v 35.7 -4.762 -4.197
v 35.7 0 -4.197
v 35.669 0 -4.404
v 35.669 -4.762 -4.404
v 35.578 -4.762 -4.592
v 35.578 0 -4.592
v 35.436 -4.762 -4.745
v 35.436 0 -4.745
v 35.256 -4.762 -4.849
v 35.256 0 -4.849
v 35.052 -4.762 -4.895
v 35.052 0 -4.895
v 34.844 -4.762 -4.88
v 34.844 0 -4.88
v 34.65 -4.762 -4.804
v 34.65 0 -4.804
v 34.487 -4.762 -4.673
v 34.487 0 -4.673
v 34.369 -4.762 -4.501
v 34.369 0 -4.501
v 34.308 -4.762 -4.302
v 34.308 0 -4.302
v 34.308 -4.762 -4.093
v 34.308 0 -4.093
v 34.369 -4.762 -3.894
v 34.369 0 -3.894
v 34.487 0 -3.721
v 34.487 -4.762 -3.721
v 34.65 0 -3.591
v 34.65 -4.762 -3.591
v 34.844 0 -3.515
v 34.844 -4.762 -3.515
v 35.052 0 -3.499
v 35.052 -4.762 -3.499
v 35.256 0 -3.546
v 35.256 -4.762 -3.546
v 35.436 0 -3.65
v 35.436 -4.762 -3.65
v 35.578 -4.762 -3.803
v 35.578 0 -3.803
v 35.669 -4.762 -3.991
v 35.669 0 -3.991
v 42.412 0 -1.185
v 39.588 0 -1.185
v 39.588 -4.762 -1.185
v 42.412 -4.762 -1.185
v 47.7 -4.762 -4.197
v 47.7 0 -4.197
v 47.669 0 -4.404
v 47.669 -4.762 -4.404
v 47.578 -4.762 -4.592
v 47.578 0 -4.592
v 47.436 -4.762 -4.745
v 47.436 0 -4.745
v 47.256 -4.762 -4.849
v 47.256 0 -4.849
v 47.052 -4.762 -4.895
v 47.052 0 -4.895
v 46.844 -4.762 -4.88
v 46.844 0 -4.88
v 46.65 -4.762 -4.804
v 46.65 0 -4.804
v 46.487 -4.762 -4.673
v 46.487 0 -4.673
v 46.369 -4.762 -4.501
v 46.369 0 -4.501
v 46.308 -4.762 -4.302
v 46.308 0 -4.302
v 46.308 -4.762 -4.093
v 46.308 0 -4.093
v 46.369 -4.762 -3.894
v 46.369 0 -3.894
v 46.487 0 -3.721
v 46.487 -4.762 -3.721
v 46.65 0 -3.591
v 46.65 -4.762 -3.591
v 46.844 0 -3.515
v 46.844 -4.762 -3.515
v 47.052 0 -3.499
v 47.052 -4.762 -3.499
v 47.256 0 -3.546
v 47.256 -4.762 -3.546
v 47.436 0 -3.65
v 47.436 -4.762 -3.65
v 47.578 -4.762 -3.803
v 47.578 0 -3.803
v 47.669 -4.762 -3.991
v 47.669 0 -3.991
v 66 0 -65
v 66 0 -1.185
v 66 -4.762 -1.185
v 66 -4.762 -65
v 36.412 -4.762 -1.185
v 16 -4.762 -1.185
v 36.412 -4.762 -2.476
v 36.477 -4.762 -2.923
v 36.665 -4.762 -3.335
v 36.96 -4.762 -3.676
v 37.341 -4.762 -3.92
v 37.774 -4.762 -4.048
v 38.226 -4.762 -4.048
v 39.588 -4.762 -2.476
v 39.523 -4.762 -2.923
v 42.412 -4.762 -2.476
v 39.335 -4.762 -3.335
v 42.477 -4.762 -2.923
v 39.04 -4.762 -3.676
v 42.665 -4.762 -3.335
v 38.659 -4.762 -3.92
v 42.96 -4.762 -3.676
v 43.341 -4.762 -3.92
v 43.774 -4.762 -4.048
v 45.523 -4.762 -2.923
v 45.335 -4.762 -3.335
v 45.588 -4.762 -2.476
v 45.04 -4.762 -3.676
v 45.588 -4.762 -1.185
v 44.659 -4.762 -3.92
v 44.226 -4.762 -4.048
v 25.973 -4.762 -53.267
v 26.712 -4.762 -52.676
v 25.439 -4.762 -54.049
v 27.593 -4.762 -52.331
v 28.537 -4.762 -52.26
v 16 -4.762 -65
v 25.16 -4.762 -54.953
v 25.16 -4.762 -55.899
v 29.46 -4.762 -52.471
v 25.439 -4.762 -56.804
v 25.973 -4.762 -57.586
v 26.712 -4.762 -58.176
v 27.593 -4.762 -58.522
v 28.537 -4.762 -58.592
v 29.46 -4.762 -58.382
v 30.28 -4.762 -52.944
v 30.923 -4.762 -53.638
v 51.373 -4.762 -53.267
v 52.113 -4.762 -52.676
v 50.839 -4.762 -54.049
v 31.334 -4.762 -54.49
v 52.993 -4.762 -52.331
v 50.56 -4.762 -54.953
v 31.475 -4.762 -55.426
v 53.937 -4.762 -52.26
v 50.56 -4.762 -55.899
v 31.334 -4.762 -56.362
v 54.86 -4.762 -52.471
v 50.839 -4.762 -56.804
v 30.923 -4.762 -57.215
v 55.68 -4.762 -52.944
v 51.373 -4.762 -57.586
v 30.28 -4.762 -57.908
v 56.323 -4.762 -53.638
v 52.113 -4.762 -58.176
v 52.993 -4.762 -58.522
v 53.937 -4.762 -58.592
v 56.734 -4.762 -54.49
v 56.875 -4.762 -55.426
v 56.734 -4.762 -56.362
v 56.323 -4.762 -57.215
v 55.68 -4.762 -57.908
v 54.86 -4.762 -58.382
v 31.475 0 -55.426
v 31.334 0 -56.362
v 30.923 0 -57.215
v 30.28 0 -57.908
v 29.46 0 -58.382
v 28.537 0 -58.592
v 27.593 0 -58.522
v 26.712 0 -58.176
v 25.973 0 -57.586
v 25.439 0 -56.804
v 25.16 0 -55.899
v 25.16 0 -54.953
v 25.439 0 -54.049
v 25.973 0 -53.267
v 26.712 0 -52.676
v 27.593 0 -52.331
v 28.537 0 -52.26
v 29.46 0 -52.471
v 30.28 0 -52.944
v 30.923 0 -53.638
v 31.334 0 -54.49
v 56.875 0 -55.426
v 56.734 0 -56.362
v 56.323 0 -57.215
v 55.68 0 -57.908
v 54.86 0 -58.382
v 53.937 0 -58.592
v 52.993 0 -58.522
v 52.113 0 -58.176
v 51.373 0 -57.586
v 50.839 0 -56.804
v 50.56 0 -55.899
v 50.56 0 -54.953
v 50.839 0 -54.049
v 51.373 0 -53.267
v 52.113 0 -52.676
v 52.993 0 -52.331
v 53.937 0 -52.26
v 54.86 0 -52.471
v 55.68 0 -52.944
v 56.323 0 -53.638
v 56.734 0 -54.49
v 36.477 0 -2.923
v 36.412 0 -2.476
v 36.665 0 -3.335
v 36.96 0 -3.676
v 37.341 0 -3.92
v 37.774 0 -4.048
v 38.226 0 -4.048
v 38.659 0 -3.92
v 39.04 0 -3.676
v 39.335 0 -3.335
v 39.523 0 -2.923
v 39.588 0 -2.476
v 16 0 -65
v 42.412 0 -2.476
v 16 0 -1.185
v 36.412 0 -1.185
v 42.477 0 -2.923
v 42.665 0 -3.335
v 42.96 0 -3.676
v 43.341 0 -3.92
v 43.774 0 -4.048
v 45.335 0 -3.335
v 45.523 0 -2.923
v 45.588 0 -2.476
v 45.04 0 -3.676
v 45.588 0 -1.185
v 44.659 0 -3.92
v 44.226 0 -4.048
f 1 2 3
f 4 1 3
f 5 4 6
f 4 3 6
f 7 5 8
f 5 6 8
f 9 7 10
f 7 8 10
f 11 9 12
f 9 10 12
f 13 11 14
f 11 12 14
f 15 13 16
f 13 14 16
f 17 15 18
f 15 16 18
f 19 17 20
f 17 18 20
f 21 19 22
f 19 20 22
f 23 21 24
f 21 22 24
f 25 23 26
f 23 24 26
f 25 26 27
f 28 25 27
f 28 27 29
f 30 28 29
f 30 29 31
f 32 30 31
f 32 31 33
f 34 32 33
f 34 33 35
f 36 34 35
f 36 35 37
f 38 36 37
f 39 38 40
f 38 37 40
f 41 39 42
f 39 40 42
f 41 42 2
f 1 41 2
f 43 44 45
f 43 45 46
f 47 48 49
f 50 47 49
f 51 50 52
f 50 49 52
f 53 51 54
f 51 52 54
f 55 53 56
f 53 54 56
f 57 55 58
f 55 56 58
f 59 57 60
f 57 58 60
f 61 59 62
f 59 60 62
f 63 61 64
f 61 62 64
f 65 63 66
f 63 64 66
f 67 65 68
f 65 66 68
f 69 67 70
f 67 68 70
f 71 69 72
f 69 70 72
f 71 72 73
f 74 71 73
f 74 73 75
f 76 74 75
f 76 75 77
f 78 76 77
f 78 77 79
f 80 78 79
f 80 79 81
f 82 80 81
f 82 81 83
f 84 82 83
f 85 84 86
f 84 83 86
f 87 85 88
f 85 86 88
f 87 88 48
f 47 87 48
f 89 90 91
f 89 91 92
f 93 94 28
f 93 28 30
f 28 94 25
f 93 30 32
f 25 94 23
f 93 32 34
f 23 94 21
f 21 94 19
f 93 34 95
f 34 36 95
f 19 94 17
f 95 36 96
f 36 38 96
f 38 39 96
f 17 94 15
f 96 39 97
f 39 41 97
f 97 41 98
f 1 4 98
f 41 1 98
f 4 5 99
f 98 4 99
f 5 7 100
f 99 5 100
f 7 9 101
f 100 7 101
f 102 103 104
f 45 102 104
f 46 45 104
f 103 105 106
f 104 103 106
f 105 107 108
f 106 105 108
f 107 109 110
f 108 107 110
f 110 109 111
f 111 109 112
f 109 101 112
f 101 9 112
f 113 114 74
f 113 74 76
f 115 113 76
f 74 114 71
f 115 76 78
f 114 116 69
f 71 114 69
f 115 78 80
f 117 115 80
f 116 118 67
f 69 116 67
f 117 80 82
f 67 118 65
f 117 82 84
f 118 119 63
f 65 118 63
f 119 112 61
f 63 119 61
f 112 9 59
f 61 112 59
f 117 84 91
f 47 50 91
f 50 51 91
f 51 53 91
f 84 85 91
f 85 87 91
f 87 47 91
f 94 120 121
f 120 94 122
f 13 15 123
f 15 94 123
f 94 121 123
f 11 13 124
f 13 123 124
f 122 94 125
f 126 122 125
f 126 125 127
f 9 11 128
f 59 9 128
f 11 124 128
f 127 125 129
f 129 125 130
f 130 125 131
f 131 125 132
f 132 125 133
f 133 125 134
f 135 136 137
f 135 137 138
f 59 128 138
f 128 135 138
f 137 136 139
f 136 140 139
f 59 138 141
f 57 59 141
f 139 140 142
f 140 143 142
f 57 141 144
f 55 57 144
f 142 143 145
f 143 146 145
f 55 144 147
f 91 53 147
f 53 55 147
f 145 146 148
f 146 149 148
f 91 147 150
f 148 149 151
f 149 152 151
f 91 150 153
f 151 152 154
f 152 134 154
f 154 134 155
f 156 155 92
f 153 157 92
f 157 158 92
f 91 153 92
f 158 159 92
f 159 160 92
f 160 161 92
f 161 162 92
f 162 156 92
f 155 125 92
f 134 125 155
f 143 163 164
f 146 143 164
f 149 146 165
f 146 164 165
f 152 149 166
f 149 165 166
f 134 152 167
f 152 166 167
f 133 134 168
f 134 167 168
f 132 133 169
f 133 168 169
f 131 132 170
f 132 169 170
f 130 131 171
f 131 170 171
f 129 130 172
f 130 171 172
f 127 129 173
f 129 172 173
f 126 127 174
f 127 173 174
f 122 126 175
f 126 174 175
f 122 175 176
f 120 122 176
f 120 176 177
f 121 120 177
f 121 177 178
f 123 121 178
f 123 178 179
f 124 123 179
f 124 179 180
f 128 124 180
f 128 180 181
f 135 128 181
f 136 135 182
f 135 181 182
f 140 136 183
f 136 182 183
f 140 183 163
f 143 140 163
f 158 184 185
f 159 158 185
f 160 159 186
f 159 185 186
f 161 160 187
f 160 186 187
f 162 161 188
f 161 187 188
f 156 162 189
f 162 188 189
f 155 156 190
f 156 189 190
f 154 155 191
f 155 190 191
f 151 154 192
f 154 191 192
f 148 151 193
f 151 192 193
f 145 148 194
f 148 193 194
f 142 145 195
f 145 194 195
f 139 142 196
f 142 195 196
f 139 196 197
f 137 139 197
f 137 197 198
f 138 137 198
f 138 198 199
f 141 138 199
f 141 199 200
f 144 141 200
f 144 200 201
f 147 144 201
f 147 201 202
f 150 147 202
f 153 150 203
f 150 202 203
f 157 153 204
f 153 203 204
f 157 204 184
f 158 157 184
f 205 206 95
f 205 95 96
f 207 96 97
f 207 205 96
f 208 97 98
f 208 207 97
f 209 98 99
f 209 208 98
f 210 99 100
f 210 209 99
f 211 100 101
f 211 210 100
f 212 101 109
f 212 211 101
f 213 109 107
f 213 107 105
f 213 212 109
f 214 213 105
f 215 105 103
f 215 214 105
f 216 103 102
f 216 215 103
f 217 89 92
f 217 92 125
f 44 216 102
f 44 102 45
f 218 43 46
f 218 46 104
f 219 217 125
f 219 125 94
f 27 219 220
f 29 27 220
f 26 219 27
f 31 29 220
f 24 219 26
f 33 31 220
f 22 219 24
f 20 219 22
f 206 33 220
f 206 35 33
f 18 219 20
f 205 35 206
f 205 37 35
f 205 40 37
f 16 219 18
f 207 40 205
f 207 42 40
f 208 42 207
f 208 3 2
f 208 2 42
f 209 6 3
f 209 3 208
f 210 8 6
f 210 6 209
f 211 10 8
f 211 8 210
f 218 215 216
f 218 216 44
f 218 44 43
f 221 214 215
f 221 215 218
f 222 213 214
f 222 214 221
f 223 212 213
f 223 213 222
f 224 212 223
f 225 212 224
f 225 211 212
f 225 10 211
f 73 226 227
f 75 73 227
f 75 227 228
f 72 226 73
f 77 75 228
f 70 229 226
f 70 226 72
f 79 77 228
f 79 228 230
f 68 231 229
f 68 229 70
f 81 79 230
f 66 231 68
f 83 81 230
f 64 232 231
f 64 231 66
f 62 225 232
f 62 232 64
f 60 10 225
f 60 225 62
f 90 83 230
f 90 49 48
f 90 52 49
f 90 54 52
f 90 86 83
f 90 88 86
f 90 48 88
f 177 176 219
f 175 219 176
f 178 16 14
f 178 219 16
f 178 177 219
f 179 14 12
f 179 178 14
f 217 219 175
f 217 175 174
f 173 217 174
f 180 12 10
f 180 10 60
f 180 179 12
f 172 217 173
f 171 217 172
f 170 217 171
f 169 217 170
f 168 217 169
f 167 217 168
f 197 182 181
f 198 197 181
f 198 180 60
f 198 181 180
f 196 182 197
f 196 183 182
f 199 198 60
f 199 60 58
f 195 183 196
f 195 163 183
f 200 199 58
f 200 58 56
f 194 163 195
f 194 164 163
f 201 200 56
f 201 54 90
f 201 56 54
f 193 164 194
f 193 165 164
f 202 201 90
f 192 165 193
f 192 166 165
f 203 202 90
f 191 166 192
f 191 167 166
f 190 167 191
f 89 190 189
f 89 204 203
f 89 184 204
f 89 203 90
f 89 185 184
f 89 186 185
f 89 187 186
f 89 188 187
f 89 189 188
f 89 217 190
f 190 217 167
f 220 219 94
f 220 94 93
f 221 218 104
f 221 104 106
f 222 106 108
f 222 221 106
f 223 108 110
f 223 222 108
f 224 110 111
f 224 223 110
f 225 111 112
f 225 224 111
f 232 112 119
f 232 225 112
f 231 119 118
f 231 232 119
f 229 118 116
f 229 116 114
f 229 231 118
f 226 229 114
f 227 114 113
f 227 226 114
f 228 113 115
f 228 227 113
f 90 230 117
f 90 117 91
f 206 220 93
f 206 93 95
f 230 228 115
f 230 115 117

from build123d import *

# Parameters (mm, degrees)
SKETCH1_R           = 0.7
SKETCH1_R_2         = 3.175
BOSS_EXTRUDE1_DEPTH = 4.7625


with BuildPart() as part:
    # Sketch1 → Boss-Extrude1 (new body)
    with BuildSketch(Plane(origin=(0, 0, 0), x_dir=(1, 0, 0), z_dir=(0, 1, 0))):
        with BuildLine():
            Line((16, 1.185131266), (36.4125, 1.185131266))
            Line((36.4125, 1.185131266), (36.4125, 2.47623548))
            ThreePointArc((36.4125, 2.47623548), (38, 4.06373548), (39.5875, 2.47623548))
            Line((39.5875, 2.47623548), (39.5875, 1.185131266))
            Line((39.5875, 1.185131266), (42.4125, 1.185131266))
            Line((42.4125, 1.185131266), (42.4125, 2.47623548))
            ThreePointArc((42.4125, 2.47623548), (44, 4.06373548), (45.5875, 2.47623548))
            Line((45.5875, 2.47623548), (45.5875, 1.185131266))
            Line((45.5875, 1.185131266), (66, 1.185131266))
            Line((66, 1.185131266), (66, 65))
            Line((66, 65), (16, 65))
            Line((16, 65), (16, 1.185131266))
        make_face()
        with Locations((35, 4.197327459)):
            Circle(SKETCH1_R, mode=Mode.SUBTRACT)
        with Locations((53.7, 55.426122104)):
            Circle(SKETCH1_R_2, mode=Mode.SUBTRACT)
        with Locations((28.3, 55.426122104)):
            Circle(SKETCH1_R_2, mode=Mode.SUBTRACT)
        with Locations((47, 4.197327459)):
            Circle(SKETCH1_R, mode=Mode.SUBTRACT)
    extrude(amount=-BOSS_EXTRUDE1_DEPTH)


solid = part.part
